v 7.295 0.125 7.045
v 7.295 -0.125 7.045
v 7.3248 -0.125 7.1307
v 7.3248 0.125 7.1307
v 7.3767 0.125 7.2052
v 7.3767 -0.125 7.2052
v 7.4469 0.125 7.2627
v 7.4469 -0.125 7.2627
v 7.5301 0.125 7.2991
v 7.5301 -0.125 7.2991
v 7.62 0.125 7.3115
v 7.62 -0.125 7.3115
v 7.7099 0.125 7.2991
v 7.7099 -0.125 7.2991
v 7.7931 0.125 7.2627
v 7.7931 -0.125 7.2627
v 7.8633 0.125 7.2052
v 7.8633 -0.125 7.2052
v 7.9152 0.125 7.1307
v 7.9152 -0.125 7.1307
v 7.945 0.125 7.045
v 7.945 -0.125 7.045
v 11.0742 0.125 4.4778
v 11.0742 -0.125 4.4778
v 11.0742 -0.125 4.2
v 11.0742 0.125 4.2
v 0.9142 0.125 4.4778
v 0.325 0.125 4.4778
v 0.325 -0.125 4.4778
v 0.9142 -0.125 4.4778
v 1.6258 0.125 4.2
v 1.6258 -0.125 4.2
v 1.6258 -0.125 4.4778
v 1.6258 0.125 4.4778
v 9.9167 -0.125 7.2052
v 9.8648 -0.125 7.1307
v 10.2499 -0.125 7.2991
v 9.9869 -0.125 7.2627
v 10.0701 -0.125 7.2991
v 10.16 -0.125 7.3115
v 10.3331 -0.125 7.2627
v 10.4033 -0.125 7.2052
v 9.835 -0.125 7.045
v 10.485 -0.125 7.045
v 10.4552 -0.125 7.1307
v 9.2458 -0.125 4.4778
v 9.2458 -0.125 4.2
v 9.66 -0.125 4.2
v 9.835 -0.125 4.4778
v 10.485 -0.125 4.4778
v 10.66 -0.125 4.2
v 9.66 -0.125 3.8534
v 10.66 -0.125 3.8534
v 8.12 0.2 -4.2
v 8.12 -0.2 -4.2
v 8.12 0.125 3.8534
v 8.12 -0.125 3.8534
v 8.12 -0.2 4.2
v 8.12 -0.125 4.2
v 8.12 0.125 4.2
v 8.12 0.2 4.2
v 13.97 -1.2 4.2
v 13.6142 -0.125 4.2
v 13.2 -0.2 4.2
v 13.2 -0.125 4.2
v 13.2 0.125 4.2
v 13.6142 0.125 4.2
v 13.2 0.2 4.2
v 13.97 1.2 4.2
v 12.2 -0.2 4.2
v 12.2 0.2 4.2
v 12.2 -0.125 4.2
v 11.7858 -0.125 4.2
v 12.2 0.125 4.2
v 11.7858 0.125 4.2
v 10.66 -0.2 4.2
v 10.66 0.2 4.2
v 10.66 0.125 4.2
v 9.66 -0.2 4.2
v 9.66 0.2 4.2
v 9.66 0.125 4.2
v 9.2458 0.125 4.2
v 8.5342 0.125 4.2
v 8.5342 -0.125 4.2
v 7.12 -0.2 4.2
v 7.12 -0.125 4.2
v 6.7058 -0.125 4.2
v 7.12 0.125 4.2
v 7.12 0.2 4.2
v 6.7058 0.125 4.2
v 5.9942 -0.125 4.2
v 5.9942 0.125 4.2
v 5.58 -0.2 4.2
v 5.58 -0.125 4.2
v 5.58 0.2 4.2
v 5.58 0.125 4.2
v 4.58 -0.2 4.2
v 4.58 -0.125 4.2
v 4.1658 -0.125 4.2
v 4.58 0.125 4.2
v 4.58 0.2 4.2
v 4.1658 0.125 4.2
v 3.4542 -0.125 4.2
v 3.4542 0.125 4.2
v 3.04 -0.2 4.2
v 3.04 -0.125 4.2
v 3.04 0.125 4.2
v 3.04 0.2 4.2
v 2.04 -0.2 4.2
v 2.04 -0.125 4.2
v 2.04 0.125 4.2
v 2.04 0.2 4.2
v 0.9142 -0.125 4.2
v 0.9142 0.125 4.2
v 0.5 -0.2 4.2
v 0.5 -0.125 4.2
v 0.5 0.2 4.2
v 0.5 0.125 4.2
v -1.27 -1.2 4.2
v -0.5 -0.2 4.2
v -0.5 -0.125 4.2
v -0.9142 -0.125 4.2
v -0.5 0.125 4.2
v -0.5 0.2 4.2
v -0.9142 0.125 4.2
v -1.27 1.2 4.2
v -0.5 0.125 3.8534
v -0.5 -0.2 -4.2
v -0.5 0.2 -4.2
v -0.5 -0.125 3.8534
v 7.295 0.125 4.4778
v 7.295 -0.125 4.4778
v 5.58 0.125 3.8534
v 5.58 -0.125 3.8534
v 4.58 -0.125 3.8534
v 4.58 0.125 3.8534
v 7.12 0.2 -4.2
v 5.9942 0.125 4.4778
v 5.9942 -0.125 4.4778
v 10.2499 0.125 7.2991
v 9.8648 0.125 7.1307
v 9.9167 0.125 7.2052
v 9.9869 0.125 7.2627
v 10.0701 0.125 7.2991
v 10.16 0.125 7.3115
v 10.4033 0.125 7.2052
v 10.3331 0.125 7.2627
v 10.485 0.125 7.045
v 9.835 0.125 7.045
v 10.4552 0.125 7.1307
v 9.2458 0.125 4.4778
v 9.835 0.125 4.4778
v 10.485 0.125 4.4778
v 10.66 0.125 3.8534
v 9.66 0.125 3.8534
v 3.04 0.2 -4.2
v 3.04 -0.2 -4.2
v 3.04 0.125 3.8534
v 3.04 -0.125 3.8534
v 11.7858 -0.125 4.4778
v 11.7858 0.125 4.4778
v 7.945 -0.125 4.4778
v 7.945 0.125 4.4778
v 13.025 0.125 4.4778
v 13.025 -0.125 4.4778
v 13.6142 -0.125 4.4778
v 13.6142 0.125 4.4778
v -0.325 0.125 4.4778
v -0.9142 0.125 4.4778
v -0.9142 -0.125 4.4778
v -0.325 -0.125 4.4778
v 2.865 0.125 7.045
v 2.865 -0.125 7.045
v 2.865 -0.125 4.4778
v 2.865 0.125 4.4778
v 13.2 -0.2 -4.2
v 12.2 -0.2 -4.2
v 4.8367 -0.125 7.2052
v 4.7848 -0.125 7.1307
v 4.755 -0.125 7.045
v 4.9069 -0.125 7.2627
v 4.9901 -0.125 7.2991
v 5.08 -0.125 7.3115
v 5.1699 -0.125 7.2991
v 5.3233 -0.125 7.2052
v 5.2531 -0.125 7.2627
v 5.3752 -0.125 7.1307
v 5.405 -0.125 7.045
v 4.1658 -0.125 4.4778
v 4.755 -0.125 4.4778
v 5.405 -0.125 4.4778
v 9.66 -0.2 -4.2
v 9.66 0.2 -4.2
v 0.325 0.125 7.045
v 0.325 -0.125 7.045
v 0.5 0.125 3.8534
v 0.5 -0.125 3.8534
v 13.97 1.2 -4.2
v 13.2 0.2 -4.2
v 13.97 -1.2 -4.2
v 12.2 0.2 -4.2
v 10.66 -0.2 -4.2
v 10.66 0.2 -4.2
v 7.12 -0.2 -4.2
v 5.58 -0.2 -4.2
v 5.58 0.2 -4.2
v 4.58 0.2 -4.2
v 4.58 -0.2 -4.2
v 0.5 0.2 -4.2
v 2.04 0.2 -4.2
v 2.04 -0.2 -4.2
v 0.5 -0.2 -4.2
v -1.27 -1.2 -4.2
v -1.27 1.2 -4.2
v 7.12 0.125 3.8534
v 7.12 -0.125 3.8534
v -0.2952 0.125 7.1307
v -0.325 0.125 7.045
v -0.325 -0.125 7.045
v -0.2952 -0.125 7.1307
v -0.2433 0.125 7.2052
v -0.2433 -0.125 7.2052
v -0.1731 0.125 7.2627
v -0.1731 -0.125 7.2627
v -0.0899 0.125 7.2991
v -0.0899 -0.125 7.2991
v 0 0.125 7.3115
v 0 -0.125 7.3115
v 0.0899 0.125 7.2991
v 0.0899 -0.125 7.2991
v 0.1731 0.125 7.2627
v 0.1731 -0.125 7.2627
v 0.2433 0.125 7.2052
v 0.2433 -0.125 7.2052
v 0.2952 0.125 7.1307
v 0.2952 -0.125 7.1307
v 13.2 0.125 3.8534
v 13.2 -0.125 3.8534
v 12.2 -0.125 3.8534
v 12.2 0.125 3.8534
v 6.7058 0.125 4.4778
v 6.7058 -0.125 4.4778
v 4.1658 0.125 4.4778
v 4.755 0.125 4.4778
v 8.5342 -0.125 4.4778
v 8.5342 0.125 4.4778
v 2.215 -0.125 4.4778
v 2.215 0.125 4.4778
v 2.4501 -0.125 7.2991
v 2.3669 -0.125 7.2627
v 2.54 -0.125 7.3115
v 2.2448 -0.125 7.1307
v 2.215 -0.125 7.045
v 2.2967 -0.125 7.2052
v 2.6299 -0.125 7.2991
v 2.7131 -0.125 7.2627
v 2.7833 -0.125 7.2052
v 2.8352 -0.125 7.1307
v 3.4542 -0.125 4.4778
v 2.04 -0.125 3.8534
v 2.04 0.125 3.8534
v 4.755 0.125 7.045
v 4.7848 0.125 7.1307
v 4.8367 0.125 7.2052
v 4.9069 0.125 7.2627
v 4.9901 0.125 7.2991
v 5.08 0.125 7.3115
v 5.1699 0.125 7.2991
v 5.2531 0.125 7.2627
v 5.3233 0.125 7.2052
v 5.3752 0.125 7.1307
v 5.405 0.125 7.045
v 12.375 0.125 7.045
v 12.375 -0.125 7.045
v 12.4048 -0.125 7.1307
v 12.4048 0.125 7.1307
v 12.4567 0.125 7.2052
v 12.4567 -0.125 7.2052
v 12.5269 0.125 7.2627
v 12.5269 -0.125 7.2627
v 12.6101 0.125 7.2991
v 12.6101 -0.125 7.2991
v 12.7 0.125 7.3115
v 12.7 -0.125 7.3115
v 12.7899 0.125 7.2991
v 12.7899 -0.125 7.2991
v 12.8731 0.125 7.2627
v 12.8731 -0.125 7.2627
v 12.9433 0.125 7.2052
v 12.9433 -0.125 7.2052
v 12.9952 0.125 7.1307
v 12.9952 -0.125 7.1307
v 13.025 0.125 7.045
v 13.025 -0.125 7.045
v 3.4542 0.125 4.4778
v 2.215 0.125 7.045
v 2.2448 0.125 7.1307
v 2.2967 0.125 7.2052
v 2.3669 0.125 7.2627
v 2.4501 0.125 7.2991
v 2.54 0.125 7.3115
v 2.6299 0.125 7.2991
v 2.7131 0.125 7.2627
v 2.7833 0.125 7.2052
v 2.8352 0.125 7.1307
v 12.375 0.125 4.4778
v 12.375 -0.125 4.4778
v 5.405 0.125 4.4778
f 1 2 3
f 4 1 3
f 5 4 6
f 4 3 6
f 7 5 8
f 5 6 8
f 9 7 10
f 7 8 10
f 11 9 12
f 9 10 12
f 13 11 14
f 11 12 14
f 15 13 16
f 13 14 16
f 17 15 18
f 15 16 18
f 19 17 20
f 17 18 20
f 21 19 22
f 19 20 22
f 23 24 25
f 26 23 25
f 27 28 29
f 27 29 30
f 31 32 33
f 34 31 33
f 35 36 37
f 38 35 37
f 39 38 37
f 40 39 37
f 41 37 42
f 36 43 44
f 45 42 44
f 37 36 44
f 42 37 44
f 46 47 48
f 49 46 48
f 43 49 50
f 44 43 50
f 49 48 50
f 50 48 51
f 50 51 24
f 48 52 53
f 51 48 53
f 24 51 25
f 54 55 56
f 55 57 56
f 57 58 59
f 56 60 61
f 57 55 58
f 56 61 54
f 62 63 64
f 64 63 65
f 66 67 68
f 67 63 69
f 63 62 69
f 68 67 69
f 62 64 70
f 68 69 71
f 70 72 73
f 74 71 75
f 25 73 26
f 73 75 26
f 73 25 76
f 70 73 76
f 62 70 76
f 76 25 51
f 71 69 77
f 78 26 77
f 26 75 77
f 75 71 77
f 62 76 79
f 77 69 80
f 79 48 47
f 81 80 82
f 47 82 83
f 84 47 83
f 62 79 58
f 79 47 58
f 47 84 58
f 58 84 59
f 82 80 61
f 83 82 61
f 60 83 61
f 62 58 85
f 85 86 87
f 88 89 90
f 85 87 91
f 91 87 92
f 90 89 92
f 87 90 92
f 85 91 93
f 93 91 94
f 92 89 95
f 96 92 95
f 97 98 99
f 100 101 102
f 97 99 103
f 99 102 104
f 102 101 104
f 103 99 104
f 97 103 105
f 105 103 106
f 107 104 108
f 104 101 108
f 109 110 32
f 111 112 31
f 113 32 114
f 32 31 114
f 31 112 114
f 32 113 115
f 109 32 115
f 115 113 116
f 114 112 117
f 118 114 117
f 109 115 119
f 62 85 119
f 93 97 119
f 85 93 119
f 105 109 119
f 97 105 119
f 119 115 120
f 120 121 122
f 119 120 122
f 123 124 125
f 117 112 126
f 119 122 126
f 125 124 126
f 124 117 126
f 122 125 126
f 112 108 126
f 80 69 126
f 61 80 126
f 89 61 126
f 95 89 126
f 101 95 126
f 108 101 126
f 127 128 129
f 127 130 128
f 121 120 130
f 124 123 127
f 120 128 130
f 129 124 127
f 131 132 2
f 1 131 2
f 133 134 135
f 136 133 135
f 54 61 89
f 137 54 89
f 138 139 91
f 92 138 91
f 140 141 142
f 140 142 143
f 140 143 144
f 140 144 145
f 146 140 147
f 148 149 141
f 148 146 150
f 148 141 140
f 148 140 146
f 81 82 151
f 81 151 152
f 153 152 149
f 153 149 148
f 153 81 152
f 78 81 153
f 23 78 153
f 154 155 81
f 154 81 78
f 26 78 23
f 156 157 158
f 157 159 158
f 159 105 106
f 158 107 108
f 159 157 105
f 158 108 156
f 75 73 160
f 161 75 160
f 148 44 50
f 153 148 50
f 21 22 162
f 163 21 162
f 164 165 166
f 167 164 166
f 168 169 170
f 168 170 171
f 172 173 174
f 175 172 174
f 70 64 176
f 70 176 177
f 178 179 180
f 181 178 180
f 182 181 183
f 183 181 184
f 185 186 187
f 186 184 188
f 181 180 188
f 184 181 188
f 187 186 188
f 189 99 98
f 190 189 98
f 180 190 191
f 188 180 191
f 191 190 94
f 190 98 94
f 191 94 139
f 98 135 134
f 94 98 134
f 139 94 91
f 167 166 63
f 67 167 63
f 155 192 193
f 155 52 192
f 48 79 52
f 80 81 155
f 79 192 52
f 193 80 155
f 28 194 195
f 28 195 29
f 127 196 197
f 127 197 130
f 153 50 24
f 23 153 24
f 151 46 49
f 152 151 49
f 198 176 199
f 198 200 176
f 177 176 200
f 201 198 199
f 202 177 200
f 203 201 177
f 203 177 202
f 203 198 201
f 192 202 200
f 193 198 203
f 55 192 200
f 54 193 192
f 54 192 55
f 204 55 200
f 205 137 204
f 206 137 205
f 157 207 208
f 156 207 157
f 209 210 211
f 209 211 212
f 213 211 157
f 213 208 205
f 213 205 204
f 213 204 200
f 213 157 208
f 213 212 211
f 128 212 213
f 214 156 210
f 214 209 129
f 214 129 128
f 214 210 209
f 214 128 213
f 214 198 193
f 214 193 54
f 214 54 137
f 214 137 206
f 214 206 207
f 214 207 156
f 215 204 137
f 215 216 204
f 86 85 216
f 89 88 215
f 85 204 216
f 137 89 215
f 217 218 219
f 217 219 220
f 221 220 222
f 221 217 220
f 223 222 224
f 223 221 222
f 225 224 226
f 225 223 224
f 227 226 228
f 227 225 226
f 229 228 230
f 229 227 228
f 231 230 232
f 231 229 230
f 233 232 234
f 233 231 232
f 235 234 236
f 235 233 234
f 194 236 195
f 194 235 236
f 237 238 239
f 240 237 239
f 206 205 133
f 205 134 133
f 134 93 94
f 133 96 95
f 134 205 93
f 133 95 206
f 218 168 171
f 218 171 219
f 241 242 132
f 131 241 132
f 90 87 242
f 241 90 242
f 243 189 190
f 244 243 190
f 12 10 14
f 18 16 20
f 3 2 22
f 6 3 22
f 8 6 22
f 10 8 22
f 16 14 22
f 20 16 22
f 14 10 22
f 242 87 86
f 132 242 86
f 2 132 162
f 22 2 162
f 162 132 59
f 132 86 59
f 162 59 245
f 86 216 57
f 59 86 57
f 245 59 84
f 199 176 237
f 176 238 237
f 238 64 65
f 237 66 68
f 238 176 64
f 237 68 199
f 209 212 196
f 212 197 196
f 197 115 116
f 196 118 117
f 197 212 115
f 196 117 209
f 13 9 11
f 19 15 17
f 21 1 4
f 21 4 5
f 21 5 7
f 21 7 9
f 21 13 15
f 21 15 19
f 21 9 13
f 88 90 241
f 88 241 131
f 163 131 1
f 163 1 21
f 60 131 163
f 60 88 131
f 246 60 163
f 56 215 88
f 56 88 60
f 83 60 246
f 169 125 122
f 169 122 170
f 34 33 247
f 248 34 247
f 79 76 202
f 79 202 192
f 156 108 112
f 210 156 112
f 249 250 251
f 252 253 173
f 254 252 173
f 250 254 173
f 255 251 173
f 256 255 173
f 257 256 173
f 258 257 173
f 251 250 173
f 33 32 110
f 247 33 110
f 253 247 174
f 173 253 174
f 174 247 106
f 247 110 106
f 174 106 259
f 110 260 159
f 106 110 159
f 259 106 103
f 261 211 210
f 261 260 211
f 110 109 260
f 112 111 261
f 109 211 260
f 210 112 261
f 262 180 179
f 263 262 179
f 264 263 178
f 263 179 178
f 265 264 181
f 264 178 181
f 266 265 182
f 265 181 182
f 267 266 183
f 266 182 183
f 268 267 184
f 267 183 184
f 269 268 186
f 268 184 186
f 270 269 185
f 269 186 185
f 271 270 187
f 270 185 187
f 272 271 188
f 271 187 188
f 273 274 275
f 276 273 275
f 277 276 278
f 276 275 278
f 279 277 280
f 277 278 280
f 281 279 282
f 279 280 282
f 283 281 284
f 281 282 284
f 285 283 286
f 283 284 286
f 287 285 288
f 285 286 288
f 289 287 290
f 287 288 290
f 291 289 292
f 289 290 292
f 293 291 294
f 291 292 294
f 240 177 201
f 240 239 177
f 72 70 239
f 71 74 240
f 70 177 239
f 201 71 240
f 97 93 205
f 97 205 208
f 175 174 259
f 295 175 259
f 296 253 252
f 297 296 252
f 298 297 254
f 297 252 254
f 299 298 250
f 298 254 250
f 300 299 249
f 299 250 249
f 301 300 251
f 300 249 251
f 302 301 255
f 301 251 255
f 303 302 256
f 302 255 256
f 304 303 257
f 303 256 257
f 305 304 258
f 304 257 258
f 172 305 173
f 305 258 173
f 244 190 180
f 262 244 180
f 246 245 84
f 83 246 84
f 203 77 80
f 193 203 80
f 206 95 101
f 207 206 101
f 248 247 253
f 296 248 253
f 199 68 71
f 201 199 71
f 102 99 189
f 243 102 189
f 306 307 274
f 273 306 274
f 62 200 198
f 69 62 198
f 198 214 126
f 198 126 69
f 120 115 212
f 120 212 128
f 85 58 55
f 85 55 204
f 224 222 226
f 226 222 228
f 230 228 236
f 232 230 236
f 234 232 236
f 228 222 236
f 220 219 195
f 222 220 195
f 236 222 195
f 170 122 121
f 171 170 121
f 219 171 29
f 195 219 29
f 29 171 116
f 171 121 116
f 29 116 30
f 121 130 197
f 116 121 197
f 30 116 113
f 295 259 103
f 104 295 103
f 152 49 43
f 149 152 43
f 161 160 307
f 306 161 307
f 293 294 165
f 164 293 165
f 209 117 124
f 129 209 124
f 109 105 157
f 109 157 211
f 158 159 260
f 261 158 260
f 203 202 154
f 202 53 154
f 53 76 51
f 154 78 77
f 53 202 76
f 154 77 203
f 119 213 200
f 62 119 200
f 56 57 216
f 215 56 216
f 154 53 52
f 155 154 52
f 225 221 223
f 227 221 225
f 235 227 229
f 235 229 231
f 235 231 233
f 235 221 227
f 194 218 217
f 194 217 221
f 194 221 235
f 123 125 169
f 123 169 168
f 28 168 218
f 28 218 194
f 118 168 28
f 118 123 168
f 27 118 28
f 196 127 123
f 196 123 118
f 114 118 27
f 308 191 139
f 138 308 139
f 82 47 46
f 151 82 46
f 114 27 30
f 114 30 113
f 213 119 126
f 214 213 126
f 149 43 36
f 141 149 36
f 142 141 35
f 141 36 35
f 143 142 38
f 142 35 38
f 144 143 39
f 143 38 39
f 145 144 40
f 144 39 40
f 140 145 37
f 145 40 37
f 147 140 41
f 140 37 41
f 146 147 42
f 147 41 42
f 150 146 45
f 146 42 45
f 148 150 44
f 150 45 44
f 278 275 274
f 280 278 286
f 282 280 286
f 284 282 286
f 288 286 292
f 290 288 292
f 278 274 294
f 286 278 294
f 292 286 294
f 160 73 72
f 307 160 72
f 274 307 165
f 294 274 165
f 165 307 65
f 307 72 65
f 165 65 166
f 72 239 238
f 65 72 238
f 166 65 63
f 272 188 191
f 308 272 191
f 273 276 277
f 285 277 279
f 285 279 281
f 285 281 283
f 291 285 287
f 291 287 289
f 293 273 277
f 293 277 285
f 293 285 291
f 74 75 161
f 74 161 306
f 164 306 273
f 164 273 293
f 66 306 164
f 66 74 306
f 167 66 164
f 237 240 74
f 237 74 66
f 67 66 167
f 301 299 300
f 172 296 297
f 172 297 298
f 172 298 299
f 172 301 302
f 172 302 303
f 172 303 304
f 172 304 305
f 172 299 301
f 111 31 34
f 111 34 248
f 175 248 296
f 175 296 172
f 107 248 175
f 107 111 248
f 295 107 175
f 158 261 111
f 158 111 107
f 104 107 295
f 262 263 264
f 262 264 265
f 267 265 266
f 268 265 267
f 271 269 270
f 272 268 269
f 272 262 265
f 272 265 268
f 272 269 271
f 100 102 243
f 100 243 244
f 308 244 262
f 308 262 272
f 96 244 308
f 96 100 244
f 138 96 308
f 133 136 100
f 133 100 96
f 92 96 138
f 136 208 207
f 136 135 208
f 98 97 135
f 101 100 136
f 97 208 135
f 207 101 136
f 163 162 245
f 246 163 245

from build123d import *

# Parameters (mm, degrees)
SKETCH1_W               = 2.54
SKETCH1_H               = 2.4
SKETCH1_W_2             = 1.4
SKETCH1_H_2             = 1.45
BOSS_EXTRUDE1_DEPTH     = 4.2
BOSS_EXTRUDE3_START     = -1.2
BOSS_EXTRUDE3_DEPTH     = 0.125
LPATTERN1_START         = -0.125
LPATTERN1_DEPTH         = 0.25
LPATTERN1_2_DEPTH       = 0.25
LPATTERN1_3_DEPTH       = 0.25
LPATTERN1_4_DEPTH       = 0.25
LPATTERN1_START_2       = -4.2
LPATTERN1_5_OUTLINE_W   = 12.7
LPATTERN1_5_OUTLINE_H   = 2.4
LPATTERN1_5_OUTLINE_W_2 = 1.4
LPATTERN1_5_OUTLINE_H_2 = 1.45
LPATTERN1_5_DEPTH       = 8.4
LPATTERN1_6_DEPTH       = 0.25
BOSS_EXTRUDE4_START     = -8.4
SKETCH5_W               = 1.4
SKETCH5_H               = 1.45
SKETCH5_W_2             = 1
SKETCH5_H_2             = 0.4
BOSS_EXTRUDE4_DEPTH     = 8.4
LPATTERN2_COUNT         = 6
LPATTERN2_PITCH         = 2.54


# Read off the part's stored shape, not the designer's step: LPattern1
with BuildPart() as part:
    # Sketch1 → Boss-Extrude1 (new, symmetric)
    with BuildSketch(Plane.XY):
        Rectangle(SKETCH1_W, SKETCH1_H)
        Rectangle(SKETCH1_W_2, SKETCH1_H_2, mode=Mode.SUBTRACT)
    extrude(amount=BOSS_EXTRUDE1_DEPTH, both=True)

    # LPattern1 5 outline → LPattern1 5 (add)
    with BuildSketch(Plane.XY.offset(LPATTERN1_START_2)):
        with Locations((7.62, 0)):
            Rectangle(LPATTERN1_5_OUTLINE_W, LPATTERN1_5_OUTLINE_H)
        with Locations((2.54, 0)):
            Rectangle(LPATTERN1_5_OUTLINE_W_2, LPATTERN1_5_OUTLINE_H_2, mode=Mode.SUBTRACT)
        with Locations((5.08, 0)):
            Rectangle(LPATTERN1_5_OUTLINE_W_2, LPATTERN1_5_OUTLINE_H_2, mode=Mode.SUBTRACT)
        with Locations((7.62, 0)):
            Rectangle(LPATTERN1_5_OUTLINE_W_2, LPATTERN1_5_OUTLINE_H_2, mode=Mode.SUBTRACT)
        with Locations((10.16, 0)):
            Rectangle(LPATTERN1_5_OUTLINE_W_2, LPATTERN1_5_OUTLINE_H_2, mode=Mode.SUBTRACT)
        with Locations((12.7, 0)):
            Rectangle(LPATTERN1_5_OUTLINE_W_2, LPATTERN1_5_OUTLINE_H_2, mode=Mode.SUBTRACT)
    extrude(amount=LPATTERN1_5_DEPTH)



with BuildPart() as body_2:
    # Sketch3 → Boss-Extrude3 (new, symmetric)
    with BuildSketch(Plane(origin=(0, 1.2, 0), x_dir=(1, 0, 0), z_dir=(0, 1, 0)).offset(BOSS_EXTRUDE3_START)):
        with BuildLine():
            Line((-0.914219602, -3.853355377), (-0.914219602, -4.477752268))
            Line((-0.914219602, -4.477752268), (-0.325, -4.477752268))
            Line((-0.325, -4.477752268), (-0.325, -7.045003795))
            ThreePointArc((-0.325, -7.045003795), (0, -7.311534777), (0.325, -7.045003795))
            Line((0.325, -7.045003795), (0.325, -4.477752268))
            Line((0.325, -4.477752268), (0.914219602, -4.477752268))
            Line((0.914219602, -4.477752268), (0.914219602, -3.853355377))
            Line((0.914219602, -3.853355377), (-0.914219602, -3.853355377))
        make_face()
    extrude(amount=BOSS_EXTRUDE3_DEPTH, both=True)


with BuildPart() as body_3:
    # LPattern1 outline → LPattern1 (new body)
    with BuildSketch(Plane(origin=(0, 0, 0), x_dir=(1, 0, 0), z_dir=(0, 1, 0)).offset(LPATTERN1_START)):
        with BuildLine():
            Line((11.074219602, -4.477752268), (11.074219602, -3.853355377))
            Line((11.074219602, -3.853355377), (9.245780398, -3.853355377))
            Line((9.245780398, -3.853355377), (9.245780398, -4.477752268))
            Line((9.245780398, -4.477752268), (9.835, -4.477752268))
            Line((9.835, -4.477752268), (9.835, -7.045003795))
            ThreePointArc((9.835, -7.045003795), (10.16, -7.311534777), (10.485, -7.045003795))
            Line((10.485, -7.045003795), (10.485, -4.477752268))
            Line((10.485, -4.477752268), (11.074219602, -4.477752268))
        make_face()
    extrude(amount=LPATTERN1_DEPTH)


with BuildPart() as body_4:
    # LPattern1 2 outline → LPattern1 2 (new body)
    with BuildSketch(Plane(origin=(0, 0, 0), x_dir=(1, 0, 0), z_dir=(0, 1, 0)).offset(LPATTERN1_START)):
        with BuildLine():
            Line((8.534219602, -4.477752268), (8.534219602, -3.853355377))
            Line((8.534219602, -3.853355377), (6.705780398, -3.853355377))
            Line((6.705780398, -3.853355377), (6.705780398, -4.477752268))
            Line((6.705780398, -4.477752268), (7.295, -4.477752268))
            Line((7.295, -4.477752268), (7.295, -7.045003795))
            ThreePointArc((7.295, -7.045003795), (7.62, -7.311534777), (7.945, -7.045003795))
            Line((7.945, -7.045003795), (7.945, -4.477752268))
            Line((7.945, -4.477752268), (8.534219602, -4.477752268))
        make_face()
    extrude(amount=LPATTERN1_2_DEPTH)


with BuildPart() as body_5:
    # LPattern1 3 outline → LPattern1 3 (new body)
    with BuildSketch(Plane(origin=(0, 0, 0), x_dir=(1, 0, 0), z_dir=(0, 1, 0)).offset(LPATTERN1_START)):
        with BuildLine():
            Line((5.994219602, -4.477752268), (5.994219602, -3.853355377))
            Line((5.994219602, -3.853355377), (4.165780398, -3.853355377))
            Line((4.165780398, -3.853355377), (4.165780398, -4.477752268))
            Line((4.165780398, -4.477752268), (4.755, -4.477752268))
            Line((4.755, -4.477752268), (4.755, -7.045003795))
            ThreePointArc((4.755, -7.045003795), (5.08, -7.311534777), (5.405, -7.045003795))
            Line((5.405, -7.045003795), (5.405, -4.477752268))
            Line((5.405, -4.477752268), (5.994219602, -4.477752268))
        make_face()
    extrude(amount=LPATTERN1_3_DEPTH)


with BuildPart() as body_6:
    # LPattern1 4 outline → LPattern1 4 (new body)
    with BuildSketch(Plane(origin=(0, 0, 0), x_dir=(1, 0, 0), z_dir=(0, 1, 0)).offset(LPATTERN1_START)):
        with BuildLine():
            Line((3.454219602, -4.477752268), (3.454219602, -3.853355377))
            Line((3.454219602, -3.853355377), (1.625780398, -3.853355377))
            Line((1.625780398, -3.853355377), (1.625780398, -4.477752268))
            Line((1.625780398, -4.477752268), (2.215, -4.477752268))
            Line((2.215, -4.477752268), (2.215, -7.045003795))
            ThreePointArc((2.215, -7.045003795), (2.54, -7.311534777), (2.865, -7.045003795))
            Line((2.865, -7.045003795), (2.865, -4.477752268))
            Line((2.865, -4.477752268), (3.454219602, -4.477752268))
        make_face()
    extrude(amount=LPATTERN1_4_DEPTH)


with BuildPart() as body_7:
    # LPattern1 6 outline → LPattern1 6 (new body)
    with BuildSketch(Plane(origin=(0, 0, 0), x_dir=(1, 0, 0), z_dir=(0, 1, 0)).offset(LPATTERN1_START)):
        with BuildLine():
            Line((13.614219602, -4.477752268), (13.614219602, -3.853355377))
            Line((13.614219602, -3.853355377), (11.785780398, -3.853355377))
            Line((11.785780398, -3.853355377), (11.785780398, -4.477752268))
            Line((11.785780398, -4.477752268), (12.375, -4.477752268))
            Line((12.375, -4.477752268), (12.375, -7.045003795))
            ThreePointArc((12.375, -7.045003795), (12.7, -7.311534777), (13.025, -7.045003795))
            Line((13.025, -7.045003795), (13.025, -4.477752268))
            Line((13.025, -4.477752268), (13.614219602, -4.477752268))
        make_face()
    extrude(amount=LPATTERN1_6_DEPTH)


with BuildPart() as part_1:
    add(part.part)

    add(body_7.part)  # Boss-Extrude4 merges body 7
    # Sketch5 → Boss-Extrude4 (add)
    with BuildSketch(Plane(origin=(0, 0, -4.2), x_dir=(-1, 0, 0), z_dir=(0, 0, -1)).offset(BOSS_EXTRUDE4_START)):
        with Locations((-12.7, 0)):
            Rectangle(SKETCH5_W, SKETCH5_H)
        with Locations((-12.7, 0)):
            Rectangle(SKETCH5_W_2, SKETCH5_H_2, mode=Mode.SUBTRACT)
    boss_extrude4 = extrude(amount=BOSS_EXTRUDE4_DEPTH)


    add(body_2.part)  # LPattern2 merges body 2

    add(body_3.part)  # LPattern2 merges body 3

    add(body_4.part)  # LPattern2 merges body 4

    add(body_5.part)  # LPattern2 merges body 5

    add(body_6.part)  # LPattern2 merges body 6
    # LPattern2: Boss-Extrude4 ×6
    with Locations(*[(-i * LPATTERN2_PITCH, 0, 0) for i in range(1, LPATTERN2_COUNT)]):
        add(boss_extrude4)


solid = part_1.part
